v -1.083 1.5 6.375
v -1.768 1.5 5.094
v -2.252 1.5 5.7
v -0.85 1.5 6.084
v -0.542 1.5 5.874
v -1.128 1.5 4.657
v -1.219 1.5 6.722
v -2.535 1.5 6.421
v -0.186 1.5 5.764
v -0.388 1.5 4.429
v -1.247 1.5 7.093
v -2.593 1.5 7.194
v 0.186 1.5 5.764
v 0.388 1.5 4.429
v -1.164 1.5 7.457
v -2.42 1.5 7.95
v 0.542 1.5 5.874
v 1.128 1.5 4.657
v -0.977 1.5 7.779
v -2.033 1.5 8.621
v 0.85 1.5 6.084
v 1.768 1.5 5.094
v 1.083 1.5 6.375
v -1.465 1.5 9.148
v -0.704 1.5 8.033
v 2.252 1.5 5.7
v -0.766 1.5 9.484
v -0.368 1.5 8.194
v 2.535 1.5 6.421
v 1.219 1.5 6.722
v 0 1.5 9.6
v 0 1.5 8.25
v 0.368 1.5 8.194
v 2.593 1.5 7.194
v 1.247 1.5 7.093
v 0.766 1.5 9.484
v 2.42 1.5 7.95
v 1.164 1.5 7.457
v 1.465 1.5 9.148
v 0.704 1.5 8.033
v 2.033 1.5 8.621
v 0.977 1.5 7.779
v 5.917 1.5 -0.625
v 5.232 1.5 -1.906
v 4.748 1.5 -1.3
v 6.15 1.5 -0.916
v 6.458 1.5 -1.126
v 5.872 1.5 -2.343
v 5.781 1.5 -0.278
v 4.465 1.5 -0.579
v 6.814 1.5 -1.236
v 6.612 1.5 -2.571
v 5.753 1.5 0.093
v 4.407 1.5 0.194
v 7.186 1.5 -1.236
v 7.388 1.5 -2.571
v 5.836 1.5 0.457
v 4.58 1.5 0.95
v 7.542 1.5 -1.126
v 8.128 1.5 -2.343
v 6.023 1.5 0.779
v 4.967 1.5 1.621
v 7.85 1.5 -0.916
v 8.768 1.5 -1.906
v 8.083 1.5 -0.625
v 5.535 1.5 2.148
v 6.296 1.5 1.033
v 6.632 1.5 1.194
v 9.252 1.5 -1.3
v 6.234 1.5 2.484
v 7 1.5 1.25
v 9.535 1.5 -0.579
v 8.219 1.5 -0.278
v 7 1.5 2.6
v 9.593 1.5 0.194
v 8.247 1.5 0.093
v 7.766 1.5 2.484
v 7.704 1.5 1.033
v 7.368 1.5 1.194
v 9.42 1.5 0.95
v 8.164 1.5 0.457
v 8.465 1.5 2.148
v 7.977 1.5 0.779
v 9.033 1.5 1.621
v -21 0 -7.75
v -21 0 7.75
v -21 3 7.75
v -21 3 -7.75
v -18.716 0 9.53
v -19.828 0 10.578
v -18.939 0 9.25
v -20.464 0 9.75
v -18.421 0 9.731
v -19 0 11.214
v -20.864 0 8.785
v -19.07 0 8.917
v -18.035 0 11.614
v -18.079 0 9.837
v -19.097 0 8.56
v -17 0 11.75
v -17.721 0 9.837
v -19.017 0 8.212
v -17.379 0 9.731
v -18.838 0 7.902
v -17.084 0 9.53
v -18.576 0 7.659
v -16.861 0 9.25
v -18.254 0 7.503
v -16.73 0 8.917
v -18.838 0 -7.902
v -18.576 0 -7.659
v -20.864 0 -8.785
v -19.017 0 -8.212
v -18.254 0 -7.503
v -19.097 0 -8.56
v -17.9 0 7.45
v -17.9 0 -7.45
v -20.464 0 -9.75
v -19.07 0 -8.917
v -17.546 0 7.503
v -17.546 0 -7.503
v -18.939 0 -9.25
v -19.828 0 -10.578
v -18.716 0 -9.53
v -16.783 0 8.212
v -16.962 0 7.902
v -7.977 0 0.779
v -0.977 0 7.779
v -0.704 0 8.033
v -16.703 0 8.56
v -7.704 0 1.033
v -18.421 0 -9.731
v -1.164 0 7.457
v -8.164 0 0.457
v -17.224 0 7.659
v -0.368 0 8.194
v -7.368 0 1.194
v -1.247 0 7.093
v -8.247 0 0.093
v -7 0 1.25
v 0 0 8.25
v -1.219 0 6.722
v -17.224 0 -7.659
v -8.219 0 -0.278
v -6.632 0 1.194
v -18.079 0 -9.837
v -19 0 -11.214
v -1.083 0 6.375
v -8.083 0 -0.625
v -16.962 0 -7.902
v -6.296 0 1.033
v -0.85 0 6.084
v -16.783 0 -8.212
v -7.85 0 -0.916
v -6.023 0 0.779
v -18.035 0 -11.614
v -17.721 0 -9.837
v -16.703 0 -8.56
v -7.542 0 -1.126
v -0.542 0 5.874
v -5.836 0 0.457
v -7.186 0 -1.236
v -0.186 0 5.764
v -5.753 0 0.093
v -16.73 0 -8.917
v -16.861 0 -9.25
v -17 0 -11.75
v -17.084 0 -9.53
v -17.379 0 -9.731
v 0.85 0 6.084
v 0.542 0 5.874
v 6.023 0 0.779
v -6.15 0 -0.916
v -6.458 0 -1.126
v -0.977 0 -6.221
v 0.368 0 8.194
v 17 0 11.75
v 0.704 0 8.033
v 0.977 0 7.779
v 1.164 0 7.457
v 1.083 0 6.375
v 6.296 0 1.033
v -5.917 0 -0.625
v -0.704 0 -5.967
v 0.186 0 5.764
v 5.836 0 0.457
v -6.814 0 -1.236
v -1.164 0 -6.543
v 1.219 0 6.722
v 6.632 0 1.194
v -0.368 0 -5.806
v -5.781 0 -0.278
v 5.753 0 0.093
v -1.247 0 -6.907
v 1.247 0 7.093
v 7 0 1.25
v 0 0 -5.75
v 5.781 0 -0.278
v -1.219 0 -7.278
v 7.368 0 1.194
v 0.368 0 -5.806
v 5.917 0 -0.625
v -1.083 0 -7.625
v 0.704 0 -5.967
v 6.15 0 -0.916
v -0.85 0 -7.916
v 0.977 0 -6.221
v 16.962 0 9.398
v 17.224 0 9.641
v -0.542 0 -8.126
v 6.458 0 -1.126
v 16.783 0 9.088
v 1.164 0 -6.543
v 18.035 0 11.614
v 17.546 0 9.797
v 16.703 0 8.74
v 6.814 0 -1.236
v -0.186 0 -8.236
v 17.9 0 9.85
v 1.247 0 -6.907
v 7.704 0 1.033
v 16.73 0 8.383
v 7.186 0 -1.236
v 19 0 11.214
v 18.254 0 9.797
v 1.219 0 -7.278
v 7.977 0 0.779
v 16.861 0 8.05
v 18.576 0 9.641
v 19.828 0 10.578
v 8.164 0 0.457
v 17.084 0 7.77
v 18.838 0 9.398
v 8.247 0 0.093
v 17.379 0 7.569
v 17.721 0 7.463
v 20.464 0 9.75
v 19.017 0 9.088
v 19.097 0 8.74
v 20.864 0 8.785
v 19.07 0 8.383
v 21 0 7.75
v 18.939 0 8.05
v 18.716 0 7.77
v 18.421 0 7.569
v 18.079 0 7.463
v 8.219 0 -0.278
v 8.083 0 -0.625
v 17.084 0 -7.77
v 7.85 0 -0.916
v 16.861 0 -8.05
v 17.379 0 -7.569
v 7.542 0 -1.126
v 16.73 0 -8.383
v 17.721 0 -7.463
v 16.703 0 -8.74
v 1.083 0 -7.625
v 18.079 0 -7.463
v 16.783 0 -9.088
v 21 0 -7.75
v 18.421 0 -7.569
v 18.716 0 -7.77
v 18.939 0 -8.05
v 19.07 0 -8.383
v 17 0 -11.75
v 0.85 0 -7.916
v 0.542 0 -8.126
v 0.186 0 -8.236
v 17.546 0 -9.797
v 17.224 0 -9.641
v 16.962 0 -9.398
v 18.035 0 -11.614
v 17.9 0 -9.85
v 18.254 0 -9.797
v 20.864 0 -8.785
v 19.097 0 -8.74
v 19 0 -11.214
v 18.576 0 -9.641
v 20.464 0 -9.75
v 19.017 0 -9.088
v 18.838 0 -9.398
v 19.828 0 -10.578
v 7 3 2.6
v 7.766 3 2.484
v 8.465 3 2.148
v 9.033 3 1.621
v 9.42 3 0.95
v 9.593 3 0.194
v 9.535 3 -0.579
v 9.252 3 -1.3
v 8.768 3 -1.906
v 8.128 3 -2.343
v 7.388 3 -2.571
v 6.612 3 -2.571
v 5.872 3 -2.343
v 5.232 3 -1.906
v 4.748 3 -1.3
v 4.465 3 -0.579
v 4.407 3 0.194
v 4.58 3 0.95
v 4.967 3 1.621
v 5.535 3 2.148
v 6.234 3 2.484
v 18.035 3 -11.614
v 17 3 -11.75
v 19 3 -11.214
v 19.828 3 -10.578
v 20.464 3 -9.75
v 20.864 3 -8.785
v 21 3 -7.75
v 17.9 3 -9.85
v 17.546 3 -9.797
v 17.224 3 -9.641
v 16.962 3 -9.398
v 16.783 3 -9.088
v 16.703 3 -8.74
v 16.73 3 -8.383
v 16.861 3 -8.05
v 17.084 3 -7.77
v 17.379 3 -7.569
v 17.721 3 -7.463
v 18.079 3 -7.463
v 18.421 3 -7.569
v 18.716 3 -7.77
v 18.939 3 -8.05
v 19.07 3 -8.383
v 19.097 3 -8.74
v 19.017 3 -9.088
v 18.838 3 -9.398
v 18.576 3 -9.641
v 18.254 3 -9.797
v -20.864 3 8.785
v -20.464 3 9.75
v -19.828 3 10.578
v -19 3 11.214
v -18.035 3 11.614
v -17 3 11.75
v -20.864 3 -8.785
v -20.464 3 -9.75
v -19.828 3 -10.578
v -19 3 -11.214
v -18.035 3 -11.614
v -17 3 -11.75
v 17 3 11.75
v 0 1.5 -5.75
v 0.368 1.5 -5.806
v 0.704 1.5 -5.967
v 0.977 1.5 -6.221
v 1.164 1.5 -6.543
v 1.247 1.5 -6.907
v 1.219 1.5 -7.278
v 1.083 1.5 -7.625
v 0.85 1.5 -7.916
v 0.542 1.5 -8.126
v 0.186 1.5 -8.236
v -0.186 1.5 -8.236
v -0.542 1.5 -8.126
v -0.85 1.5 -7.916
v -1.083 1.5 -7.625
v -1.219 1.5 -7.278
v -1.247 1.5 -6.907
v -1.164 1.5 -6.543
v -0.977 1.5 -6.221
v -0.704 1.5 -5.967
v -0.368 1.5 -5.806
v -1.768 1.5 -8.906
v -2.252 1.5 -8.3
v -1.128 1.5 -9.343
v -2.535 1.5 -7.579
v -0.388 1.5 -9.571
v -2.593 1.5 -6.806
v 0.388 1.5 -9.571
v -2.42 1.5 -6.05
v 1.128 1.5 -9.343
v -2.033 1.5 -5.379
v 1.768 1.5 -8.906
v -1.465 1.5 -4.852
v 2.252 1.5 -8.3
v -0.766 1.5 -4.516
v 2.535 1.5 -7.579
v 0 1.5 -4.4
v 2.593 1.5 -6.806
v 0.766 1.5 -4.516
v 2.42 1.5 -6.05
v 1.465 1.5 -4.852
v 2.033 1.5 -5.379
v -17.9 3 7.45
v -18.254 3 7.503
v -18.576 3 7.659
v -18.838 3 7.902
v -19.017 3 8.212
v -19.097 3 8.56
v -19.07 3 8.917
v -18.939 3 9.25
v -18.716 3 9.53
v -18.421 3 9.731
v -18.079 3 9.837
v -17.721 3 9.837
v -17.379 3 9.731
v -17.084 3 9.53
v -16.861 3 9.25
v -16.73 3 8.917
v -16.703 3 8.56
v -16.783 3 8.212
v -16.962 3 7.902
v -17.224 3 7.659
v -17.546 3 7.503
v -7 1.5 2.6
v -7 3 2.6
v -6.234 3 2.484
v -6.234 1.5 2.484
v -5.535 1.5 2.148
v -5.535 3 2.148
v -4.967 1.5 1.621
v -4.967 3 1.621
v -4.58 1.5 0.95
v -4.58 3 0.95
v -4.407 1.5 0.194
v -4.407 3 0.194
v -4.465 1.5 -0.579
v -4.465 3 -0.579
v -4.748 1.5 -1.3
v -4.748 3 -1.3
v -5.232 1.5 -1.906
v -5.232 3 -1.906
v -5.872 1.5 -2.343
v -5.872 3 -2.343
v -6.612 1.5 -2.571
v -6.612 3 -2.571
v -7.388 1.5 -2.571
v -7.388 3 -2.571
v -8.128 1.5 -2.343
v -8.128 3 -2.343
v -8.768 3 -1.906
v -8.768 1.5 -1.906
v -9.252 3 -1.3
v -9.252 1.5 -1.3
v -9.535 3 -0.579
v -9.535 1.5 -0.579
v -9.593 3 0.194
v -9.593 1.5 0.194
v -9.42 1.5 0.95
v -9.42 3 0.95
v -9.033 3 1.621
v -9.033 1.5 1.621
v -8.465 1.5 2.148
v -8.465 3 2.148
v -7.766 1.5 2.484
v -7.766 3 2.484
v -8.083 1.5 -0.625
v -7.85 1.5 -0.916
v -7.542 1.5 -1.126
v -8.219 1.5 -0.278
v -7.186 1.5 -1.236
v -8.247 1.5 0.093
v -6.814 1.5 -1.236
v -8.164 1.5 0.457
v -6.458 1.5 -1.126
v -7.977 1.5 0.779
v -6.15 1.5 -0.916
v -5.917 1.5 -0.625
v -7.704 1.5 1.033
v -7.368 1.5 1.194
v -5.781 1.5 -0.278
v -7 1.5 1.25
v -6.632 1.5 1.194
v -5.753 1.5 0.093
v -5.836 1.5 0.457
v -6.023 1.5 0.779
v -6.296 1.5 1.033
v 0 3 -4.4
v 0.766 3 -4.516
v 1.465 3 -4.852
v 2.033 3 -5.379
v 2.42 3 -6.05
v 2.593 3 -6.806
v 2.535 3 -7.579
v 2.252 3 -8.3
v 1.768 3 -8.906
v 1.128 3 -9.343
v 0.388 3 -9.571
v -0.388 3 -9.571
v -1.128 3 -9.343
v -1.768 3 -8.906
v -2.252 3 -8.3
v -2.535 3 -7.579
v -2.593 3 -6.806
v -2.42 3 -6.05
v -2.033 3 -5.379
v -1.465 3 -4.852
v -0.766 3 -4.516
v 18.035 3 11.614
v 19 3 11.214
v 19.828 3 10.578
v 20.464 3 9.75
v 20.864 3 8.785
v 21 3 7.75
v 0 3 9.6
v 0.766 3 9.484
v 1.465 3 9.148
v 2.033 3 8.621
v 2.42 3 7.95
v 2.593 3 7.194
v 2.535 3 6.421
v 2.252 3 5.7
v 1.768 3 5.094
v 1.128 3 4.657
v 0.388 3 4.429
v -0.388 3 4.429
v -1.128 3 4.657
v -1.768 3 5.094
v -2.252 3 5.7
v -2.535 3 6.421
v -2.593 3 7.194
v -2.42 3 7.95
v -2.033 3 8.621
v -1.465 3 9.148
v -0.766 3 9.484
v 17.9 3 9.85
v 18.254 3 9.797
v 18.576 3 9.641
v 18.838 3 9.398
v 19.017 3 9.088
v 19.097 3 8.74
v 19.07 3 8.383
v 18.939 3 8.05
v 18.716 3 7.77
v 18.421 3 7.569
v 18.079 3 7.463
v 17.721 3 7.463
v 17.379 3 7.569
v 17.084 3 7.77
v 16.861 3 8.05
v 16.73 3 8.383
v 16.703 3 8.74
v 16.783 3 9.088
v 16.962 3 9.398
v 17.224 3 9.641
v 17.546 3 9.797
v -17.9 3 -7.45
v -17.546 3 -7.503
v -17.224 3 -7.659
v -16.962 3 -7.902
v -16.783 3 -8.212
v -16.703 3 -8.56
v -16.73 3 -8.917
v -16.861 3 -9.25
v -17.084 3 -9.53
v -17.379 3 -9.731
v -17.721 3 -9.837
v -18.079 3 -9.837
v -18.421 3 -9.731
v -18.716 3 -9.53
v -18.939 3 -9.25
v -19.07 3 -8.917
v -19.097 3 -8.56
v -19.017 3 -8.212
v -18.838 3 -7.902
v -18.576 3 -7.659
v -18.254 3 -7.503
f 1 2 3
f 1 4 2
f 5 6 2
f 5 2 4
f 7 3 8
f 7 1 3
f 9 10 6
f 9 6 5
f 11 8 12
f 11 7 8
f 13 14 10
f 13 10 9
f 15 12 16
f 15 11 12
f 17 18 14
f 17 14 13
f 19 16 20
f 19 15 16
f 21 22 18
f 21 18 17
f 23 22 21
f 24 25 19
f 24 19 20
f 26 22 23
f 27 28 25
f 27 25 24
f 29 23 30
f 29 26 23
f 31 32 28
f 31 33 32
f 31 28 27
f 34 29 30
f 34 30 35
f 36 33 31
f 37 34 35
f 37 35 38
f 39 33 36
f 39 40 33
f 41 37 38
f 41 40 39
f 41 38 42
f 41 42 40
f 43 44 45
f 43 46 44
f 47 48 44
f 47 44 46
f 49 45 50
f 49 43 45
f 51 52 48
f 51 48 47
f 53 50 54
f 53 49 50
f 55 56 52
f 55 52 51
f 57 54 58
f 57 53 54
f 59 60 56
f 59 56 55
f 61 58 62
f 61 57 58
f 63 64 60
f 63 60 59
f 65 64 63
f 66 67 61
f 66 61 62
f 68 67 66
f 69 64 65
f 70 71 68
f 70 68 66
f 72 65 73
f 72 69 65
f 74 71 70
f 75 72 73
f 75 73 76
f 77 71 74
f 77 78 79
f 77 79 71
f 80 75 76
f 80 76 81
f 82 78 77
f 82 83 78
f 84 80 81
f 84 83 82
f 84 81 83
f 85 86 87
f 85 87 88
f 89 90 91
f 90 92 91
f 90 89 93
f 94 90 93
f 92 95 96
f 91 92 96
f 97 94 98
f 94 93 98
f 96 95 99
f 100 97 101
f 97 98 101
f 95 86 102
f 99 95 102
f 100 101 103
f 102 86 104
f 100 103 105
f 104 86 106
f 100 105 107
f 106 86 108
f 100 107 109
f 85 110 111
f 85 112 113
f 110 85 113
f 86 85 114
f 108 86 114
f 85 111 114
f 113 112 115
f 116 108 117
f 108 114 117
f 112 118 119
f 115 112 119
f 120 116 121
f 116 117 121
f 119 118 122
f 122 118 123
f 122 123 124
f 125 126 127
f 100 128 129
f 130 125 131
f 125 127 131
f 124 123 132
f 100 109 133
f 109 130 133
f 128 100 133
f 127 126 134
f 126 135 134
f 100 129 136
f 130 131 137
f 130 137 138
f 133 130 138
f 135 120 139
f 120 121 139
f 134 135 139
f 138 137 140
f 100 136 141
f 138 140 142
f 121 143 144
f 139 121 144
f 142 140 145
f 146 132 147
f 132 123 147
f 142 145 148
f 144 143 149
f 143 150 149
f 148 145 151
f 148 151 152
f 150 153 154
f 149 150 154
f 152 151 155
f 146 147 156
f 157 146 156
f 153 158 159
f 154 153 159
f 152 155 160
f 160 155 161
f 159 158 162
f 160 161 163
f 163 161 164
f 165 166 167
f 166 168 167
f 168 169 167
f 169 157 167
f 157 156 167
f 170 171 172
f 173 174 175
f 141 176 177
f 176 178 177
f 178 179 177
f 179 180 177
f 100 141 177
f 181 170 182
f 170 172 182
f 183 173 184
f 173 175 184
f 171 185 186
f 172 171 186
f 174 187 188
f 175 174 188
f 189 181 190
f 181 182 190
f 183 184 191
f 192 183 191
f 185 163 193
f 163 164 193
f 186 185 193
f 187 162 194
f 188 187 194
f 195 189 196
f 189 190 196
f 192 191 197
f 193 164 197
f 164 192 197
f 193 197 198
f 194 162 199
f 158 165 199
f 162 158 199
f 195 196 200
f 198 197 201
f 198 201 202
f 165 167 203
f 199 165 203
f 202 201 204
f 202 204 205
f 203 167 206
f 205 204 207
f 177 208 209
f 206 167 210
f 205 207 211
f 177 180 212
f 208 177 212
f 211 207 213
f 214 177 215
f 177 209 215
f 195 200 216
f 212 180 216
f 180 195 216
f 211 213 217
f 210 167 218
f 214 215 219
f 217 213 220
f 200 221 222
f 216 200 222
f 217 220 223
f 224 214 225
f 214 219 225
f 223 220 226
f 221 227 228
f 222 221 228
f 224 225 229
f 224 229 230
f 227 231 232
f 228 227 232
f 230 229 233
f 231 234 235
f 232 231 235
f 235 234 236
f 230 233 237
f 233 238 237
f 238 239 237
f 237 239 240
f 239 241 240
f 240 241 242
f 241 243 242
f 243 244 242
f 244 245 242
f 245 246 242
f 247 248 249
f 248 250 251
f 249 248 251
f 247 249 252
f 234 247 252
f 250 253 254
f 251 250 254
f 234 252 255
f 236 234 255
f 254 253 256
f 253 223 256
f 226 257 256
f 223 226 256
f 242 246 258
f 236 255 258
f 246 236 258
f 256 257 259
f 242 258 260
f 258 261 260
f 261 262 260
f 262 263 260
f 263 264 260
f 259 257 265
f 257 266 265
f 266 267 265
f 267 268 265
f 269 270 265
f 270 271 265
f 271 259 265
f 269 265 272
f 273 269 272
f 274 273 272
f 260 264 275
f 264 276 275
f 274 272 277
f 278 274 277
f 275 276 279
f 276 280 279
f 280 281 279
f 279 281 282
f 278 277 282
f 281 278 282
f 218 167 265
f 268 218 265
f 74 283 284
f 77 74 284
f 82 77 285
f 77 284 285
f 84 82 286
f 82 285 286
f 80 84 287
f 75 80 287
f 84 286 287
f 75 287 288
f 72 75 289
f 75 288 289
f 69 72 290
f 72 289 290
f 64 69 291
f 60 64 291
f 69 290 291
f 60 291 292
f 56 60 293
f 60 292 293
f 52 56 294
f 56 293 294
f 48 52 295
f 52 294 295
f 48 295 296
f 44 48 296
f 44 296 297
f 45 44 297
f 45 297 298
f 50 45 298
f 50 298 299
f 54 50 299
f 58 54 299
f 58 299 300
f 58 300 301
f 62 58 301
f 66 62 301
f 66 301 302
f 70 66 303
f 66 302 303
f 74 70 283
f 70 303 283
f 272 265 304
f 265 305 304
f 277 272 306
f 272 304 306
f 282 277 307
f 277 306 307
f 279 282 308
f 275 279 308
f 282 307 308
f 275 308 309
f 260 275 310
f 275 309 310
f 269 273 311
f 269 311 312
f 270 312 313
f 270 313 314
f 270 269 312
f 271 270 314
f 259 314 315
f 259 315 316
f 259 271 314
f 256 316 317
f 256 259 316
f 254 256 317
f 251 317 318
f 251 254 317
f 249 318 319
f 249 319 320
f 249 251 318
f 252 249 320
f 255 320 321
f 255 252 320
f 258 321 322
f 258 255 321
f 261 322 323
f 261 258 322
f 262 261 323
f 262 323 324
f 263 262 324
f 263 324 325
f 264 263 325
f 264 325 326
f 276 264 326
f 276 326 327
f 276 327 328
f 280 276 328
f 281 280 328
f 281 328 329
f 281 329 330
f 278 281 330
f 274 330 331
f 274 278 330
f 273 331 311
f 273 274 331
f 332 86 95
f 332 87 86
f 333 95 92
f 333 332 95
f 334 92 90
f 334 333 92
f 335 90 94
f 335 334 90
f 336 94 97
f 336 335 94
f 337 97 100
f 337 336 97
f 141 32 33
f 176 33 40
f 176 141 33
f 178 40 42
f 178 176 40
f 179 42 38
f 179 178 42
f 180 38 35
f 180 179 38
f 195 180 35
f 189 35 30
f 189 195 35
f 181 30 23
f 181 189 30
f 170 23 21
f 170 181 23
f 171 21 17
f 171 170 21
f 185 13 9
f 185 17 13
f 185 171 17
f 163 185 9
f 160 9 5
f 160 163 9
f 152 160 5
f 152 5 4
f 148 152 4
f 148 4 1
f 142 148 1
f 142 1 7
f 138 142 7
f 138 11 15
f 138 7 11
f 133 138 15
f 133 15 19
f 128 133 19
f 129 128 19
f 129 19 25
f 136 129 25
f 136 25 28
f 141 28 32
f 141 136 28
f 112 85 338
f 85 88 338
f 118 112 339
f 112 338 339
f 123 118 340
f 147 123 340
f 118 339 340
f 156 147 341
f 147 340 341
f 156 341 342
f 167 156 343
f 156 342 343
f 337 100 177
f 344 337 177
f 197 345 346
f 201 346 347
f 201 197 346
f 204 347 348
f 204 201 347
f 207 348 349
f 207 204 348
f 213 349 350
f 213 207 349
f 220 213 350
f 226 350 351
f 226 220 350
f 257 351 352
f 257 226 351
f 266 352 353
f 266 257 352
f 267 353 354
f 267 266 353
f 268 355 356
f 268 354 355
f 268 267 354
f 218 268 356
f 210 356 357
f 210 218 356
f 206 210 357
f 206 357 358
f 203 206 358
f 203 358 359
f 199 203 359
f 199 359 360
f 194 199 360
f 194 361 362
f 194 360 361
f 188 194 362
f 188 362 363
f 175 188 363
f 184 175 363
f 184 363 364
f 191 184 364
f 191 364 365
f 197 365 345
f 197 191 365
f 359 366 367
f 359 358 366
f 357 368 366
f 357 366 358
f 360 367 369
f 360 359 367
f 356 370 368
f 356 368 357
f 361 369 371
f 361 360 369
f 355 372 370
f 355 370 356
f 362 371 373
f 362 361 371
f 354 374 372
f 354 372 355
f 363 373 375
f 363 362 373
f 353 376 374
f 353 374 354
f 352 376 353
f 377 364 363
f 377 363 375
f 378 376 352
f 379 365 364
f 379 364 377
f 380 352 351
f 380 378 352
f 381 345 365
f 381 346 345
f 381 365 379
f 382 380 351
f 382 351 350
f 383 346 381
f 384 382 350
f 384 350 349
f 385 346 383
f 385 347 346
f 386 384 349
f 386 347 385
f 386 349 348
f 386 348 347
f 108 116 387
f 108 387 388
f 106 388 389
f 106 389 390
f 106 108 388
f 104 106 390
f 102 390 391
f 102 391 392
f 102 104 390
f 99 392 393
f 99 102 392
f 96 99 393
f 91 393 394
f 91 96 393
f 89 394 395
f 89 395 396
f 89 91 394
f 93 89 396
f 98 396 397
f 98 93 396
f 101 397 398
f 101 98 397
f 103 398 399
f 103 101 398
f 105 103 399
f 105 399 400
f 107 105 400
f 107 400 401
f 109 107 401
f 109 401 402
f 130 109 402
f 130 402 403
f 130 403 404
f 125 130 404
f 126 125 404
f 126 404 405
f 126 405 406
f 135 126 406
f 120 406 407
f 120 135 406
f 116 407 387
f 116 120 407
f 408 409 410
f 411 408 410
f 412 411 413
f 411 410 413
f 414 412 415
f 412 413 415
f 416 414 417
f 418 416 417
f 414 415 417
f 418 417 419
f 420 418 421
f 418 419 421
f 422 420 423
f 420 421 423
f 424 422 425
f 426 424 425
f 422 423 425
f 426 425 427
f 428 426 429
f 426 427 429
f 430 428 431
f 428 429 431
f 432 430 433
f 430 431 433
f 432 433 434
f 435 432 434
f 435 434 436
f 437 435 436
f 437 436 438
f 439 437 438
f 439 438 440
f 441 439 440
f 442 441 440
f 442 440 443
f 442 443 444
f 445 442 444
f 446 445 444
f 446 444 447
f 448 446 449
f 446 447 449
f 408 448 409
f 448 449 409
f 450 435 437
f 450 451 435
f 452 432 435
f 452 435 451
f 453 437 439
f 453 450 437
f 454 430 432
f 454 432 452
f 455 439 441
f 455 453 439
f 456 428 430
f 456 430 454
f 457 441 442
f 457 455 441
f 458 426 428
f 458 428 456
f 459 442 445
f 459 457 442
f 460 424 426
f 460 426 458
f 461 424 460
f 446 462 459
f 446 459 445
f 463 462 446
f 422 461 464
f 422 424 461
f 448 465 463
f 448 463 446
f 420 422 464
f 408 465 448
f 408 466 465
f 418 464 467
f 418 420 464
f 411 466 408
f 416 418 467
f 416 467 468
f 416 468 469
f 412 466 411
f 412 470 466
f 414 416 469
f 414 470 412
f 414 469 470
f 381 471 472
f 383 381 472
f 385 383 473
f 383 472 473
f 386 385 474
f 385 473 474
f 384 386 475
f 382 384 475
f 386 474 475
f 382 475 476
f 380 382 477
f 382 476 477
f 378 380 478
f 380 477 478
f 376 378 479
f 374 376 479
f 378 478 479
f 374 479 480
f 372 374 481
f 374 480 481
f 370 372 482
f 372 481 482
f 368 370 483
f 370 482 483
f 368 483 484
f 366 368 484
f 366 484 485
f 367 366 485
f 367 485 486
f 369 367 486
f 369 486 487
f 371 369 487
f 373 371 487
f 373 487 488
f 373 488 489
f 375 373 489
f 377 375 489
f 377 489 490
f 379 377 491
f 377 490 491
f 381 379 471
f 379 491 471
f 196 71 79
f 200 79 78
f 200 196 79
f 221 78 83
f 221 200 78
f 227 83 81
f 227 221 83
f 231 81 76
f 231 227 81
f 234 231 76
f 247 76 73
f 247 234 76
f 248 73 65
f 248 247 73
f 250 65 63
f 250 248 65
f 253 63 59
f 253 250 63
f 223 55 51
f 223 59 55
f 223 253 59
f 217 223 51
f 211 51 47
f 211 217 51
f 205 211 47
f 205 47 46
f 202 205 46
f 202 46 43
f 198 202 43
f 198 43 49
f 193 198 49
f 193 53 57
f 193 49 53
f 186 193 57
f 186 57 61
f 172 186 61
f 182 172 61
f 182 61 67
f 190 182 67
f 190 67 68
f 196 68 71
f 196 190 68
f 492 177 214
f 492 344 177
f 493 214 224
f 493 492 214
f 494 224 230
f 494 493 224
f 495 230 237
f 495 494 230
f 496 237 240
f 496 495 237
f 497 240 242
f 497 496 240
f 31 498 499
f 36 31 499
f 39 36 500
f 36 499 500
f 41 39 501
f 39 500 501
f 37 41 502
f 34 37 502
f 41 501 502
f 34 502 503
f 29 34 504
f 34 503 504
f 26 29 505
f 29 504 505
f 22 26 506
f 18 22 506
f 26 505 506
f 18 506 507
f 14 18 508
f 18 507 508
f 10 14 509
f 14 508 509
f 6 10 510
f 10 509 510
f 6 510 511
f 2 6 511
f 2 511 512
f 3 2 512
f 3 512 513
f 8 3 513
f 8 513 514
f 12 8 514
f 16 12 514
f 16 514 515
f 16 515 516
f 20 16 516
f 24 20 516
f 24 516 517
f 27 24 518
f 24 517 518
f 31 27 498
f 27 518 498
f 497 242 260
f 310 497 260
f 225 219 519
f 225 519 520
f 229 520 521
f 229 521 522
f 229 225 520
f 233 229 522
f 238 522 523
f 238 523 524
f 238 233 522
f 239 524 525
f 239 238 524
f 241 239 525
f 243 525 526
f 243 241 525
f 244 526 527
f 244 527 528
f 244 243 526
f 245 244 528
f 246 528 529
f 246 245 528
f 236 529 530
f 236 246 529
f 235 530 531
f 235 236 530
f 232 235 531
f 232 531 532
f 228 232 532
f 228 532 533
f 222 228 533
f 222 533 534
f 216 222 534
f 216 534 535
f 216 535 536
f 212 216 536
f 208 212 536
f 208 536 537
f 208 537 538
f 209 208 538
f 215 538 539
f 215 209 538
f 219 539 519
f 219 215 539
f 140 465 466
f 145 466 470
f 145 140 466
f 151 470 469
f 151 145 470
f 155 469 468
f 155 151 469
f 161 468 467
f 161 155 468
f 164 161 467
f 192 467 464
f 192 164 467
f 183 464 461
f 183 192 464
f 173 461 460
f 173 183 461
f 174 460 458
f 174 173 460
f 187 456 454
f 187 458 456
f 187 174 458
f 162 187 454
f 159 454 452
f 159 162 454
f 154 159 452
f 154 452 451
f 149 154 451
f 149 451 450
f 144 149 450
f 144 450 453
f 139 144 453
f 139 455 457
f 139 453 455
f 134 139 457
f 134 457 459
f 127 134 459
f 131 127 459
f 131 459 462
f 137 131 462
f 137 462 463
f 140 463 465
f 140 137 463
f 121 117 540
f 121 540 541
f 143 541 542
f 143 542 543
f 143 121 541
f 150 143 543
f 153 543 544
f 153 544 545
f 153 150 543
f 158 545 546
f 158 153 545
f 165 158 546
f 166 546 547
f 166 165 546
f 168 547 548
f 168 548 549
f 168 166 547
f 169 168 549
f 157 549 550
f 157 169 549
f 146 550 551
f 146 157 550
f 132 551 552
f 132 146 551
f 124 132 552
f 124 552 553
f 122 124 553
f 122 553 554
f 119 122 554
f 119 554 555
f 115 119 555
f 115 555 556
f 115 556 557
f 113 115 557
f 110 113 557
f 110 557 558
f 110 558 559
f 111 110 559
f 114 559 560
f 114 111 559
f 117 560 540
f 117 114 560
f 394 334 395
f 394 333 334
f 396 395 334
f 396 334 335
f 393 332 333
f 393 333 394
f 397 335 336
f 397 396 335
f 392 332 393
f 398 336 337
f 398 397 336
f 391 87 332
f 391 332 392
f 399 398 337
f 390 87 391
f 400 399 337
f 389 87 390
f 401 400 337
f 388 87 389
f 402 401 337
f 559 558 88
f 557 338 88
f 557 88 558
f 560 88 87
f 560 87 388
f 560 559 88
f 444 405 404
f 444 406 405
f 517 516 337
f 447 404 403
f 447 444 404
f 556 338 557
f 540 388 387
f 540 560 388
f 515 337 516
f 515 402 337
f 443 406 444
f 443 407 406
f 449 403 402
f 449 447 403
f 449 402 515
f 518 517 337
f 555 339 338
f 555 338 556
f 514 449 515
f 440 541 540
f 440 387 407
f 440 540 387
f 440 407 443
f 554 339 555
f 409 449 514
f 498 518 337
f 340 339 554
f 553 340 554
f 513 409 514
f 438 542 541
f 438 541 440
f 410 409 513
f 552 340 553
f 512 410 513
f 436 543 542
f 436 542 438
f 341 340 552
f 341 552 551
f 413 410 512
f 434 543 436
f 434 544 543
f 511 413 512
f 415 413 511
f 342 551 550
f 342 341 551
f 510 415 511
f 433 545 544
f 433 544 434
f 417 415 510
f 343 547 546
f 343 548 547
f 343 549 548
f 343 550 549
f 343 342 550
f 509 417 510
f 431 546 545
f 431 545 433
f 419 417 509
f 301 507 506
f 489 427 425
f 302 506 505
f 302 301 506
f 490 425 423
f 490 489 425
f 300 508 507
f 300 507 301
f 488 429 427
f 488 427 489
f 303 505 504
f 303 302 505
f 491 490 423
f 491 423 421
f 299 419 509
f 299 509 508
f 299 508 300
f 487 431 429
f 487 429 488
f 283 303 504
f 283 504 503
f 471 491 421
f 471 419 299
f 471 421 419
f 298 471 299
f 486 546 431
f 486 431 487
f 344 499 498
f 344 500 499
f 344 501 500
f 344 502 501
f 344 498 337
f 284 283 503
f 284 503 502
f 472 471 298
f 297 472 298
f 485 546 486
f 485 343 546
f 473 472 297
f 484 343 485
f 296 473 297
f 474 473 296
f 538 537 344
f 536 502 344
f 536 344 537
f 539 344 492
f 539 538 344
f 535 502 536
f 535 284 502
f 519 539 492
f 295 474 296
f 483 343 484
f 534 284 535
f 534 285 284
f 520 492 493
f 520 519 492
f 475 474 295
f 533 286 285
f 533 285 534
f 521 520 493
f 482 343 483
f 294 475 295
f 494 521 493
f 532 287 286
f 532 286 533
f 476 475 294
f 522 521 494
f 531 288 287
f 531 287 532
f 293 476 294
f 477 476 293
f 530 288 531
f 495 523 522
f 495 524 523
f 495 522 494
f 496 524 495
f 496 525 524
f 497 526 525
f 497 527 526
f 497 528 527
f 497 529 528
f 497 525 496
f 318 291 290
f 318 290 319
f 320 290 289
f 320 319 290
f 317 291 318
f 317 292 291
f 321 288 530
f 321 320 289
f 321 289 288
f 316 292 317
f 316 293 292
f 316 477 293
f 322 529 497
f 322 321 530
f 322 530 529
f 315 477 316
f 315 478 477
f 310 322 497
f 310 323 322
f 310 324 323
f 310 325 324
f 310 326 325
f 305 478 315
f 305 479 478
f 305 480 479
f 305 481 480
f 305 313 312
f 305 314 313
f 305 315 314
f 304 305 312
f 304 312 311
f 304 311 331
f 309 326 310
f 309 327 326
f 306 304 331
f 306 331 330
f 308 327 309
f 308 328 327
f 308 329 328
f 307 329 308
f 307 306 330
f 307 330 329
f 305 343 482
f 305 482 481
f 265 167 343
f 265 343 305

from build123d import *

# Parameters (mm, degrees)
SKETCH_1_W          = 42
SKETCH_1_H          = 23.5
SKETCH_1_R          = 1.25
SKETCH_1_R_2        = 1.2
EXTRUDE_1_DEPTH     = 3
FILLET_1_R          = 4
SKETCH_2_R          = 2.6
CUT_EXTRUDE_1_DEPTH = 1.5


with BuildPart() as part:
    # 草图1 → 凸台-拉伸1 (new body)
    with BuildSketch(Plane(origin=(0, 0, 0), x_dir=(1, 0, 0), z_dir=(0, 1, 0))):
        Rectangle(SKETCH_1_W, SKETCH_1_H)
        with Locations(Location((7, 0, 0), (0, 0, 270))):
            Circle(SKETCH_1_R, mode=Mode.SUBTRACT)
        with Locations(Location((0, -7, 0), (0, 0, 270))):
            Circle(SKETCH_1_R, mode=Mode.SUBTRACT)
        with Locations(Location((-7, 0, 0), (0, 0, 270))):
            Circle(SKETCH_1_R, mode=Mode.SUBTRACT)
        with Locations(Location((0, 7, 0), (0, 0, 270))):
            Circle(SKETCH_1_R, mode=Mode.SUBTRACT)
        with Locations(Location((-17.9, 8.65, 0), (0, 0, 270))):
            Circle(SKETCH_1_R_2, mode=Mode.SUBTRACT)
        with Locations(Location((17.9, 8.65, 0), (0, 0, 90))):
            Circle(SKETCH_1_R_2, mode=Mode.SUBTRACT)
        with Locations(Location((-17.9, -8.65, 0), (0, 0, 90))):
            Circle(SKETCH_1_R_2, mode=Mode.SUBTRACT)
        with Locations(Location((17.9, -8.65, 0), (0, 0, 270))):
            Circle(SKETCH_1_R_2, mode=Mode.SUBTRACT)
    extrude(amount=EXTRUDE_1_DEPTH)

    # 圆角1
    fillet_1_edges = [part.edges().sort_by_distance(p)[0] for p in [
        (-21, 1.5, -11.75),
        (21, 1.5, -11.75),
        (21, 1.5, 11.75),
        (-21, 1.5, 11.75),
    ]]
    fillet(fillet_1_edges, radius=FILLET_1_R)

    # 草图2 → 切除-拉伸1 (cut)
    with BuildSketch(Plane(origin=(0, 3, 0), x_dir=(1, 0, 0), z_dir=(0, 1, 0))):
        with Locations(Location((7, 0, 0), (0, 0, 270))):
            Circle(SKETCH_2_R)
        with Locations(Location((0, -7, 0), (0, 0, 270))):
            Circle(SKETCH_2_R)
        with Locations(Location((-7, 0, 0), (0, 0, 270))):
            Circle(SKETCH_2_R)
        with Locations(Location((0, 7, 0), (0, 0, 270))):
            Circle(SKETCH_2_R)
    extrude(amount=-CUT_EXTRUDE_1_DEPTH, mode=Mode.SUBTRACT)


solid = part.part
